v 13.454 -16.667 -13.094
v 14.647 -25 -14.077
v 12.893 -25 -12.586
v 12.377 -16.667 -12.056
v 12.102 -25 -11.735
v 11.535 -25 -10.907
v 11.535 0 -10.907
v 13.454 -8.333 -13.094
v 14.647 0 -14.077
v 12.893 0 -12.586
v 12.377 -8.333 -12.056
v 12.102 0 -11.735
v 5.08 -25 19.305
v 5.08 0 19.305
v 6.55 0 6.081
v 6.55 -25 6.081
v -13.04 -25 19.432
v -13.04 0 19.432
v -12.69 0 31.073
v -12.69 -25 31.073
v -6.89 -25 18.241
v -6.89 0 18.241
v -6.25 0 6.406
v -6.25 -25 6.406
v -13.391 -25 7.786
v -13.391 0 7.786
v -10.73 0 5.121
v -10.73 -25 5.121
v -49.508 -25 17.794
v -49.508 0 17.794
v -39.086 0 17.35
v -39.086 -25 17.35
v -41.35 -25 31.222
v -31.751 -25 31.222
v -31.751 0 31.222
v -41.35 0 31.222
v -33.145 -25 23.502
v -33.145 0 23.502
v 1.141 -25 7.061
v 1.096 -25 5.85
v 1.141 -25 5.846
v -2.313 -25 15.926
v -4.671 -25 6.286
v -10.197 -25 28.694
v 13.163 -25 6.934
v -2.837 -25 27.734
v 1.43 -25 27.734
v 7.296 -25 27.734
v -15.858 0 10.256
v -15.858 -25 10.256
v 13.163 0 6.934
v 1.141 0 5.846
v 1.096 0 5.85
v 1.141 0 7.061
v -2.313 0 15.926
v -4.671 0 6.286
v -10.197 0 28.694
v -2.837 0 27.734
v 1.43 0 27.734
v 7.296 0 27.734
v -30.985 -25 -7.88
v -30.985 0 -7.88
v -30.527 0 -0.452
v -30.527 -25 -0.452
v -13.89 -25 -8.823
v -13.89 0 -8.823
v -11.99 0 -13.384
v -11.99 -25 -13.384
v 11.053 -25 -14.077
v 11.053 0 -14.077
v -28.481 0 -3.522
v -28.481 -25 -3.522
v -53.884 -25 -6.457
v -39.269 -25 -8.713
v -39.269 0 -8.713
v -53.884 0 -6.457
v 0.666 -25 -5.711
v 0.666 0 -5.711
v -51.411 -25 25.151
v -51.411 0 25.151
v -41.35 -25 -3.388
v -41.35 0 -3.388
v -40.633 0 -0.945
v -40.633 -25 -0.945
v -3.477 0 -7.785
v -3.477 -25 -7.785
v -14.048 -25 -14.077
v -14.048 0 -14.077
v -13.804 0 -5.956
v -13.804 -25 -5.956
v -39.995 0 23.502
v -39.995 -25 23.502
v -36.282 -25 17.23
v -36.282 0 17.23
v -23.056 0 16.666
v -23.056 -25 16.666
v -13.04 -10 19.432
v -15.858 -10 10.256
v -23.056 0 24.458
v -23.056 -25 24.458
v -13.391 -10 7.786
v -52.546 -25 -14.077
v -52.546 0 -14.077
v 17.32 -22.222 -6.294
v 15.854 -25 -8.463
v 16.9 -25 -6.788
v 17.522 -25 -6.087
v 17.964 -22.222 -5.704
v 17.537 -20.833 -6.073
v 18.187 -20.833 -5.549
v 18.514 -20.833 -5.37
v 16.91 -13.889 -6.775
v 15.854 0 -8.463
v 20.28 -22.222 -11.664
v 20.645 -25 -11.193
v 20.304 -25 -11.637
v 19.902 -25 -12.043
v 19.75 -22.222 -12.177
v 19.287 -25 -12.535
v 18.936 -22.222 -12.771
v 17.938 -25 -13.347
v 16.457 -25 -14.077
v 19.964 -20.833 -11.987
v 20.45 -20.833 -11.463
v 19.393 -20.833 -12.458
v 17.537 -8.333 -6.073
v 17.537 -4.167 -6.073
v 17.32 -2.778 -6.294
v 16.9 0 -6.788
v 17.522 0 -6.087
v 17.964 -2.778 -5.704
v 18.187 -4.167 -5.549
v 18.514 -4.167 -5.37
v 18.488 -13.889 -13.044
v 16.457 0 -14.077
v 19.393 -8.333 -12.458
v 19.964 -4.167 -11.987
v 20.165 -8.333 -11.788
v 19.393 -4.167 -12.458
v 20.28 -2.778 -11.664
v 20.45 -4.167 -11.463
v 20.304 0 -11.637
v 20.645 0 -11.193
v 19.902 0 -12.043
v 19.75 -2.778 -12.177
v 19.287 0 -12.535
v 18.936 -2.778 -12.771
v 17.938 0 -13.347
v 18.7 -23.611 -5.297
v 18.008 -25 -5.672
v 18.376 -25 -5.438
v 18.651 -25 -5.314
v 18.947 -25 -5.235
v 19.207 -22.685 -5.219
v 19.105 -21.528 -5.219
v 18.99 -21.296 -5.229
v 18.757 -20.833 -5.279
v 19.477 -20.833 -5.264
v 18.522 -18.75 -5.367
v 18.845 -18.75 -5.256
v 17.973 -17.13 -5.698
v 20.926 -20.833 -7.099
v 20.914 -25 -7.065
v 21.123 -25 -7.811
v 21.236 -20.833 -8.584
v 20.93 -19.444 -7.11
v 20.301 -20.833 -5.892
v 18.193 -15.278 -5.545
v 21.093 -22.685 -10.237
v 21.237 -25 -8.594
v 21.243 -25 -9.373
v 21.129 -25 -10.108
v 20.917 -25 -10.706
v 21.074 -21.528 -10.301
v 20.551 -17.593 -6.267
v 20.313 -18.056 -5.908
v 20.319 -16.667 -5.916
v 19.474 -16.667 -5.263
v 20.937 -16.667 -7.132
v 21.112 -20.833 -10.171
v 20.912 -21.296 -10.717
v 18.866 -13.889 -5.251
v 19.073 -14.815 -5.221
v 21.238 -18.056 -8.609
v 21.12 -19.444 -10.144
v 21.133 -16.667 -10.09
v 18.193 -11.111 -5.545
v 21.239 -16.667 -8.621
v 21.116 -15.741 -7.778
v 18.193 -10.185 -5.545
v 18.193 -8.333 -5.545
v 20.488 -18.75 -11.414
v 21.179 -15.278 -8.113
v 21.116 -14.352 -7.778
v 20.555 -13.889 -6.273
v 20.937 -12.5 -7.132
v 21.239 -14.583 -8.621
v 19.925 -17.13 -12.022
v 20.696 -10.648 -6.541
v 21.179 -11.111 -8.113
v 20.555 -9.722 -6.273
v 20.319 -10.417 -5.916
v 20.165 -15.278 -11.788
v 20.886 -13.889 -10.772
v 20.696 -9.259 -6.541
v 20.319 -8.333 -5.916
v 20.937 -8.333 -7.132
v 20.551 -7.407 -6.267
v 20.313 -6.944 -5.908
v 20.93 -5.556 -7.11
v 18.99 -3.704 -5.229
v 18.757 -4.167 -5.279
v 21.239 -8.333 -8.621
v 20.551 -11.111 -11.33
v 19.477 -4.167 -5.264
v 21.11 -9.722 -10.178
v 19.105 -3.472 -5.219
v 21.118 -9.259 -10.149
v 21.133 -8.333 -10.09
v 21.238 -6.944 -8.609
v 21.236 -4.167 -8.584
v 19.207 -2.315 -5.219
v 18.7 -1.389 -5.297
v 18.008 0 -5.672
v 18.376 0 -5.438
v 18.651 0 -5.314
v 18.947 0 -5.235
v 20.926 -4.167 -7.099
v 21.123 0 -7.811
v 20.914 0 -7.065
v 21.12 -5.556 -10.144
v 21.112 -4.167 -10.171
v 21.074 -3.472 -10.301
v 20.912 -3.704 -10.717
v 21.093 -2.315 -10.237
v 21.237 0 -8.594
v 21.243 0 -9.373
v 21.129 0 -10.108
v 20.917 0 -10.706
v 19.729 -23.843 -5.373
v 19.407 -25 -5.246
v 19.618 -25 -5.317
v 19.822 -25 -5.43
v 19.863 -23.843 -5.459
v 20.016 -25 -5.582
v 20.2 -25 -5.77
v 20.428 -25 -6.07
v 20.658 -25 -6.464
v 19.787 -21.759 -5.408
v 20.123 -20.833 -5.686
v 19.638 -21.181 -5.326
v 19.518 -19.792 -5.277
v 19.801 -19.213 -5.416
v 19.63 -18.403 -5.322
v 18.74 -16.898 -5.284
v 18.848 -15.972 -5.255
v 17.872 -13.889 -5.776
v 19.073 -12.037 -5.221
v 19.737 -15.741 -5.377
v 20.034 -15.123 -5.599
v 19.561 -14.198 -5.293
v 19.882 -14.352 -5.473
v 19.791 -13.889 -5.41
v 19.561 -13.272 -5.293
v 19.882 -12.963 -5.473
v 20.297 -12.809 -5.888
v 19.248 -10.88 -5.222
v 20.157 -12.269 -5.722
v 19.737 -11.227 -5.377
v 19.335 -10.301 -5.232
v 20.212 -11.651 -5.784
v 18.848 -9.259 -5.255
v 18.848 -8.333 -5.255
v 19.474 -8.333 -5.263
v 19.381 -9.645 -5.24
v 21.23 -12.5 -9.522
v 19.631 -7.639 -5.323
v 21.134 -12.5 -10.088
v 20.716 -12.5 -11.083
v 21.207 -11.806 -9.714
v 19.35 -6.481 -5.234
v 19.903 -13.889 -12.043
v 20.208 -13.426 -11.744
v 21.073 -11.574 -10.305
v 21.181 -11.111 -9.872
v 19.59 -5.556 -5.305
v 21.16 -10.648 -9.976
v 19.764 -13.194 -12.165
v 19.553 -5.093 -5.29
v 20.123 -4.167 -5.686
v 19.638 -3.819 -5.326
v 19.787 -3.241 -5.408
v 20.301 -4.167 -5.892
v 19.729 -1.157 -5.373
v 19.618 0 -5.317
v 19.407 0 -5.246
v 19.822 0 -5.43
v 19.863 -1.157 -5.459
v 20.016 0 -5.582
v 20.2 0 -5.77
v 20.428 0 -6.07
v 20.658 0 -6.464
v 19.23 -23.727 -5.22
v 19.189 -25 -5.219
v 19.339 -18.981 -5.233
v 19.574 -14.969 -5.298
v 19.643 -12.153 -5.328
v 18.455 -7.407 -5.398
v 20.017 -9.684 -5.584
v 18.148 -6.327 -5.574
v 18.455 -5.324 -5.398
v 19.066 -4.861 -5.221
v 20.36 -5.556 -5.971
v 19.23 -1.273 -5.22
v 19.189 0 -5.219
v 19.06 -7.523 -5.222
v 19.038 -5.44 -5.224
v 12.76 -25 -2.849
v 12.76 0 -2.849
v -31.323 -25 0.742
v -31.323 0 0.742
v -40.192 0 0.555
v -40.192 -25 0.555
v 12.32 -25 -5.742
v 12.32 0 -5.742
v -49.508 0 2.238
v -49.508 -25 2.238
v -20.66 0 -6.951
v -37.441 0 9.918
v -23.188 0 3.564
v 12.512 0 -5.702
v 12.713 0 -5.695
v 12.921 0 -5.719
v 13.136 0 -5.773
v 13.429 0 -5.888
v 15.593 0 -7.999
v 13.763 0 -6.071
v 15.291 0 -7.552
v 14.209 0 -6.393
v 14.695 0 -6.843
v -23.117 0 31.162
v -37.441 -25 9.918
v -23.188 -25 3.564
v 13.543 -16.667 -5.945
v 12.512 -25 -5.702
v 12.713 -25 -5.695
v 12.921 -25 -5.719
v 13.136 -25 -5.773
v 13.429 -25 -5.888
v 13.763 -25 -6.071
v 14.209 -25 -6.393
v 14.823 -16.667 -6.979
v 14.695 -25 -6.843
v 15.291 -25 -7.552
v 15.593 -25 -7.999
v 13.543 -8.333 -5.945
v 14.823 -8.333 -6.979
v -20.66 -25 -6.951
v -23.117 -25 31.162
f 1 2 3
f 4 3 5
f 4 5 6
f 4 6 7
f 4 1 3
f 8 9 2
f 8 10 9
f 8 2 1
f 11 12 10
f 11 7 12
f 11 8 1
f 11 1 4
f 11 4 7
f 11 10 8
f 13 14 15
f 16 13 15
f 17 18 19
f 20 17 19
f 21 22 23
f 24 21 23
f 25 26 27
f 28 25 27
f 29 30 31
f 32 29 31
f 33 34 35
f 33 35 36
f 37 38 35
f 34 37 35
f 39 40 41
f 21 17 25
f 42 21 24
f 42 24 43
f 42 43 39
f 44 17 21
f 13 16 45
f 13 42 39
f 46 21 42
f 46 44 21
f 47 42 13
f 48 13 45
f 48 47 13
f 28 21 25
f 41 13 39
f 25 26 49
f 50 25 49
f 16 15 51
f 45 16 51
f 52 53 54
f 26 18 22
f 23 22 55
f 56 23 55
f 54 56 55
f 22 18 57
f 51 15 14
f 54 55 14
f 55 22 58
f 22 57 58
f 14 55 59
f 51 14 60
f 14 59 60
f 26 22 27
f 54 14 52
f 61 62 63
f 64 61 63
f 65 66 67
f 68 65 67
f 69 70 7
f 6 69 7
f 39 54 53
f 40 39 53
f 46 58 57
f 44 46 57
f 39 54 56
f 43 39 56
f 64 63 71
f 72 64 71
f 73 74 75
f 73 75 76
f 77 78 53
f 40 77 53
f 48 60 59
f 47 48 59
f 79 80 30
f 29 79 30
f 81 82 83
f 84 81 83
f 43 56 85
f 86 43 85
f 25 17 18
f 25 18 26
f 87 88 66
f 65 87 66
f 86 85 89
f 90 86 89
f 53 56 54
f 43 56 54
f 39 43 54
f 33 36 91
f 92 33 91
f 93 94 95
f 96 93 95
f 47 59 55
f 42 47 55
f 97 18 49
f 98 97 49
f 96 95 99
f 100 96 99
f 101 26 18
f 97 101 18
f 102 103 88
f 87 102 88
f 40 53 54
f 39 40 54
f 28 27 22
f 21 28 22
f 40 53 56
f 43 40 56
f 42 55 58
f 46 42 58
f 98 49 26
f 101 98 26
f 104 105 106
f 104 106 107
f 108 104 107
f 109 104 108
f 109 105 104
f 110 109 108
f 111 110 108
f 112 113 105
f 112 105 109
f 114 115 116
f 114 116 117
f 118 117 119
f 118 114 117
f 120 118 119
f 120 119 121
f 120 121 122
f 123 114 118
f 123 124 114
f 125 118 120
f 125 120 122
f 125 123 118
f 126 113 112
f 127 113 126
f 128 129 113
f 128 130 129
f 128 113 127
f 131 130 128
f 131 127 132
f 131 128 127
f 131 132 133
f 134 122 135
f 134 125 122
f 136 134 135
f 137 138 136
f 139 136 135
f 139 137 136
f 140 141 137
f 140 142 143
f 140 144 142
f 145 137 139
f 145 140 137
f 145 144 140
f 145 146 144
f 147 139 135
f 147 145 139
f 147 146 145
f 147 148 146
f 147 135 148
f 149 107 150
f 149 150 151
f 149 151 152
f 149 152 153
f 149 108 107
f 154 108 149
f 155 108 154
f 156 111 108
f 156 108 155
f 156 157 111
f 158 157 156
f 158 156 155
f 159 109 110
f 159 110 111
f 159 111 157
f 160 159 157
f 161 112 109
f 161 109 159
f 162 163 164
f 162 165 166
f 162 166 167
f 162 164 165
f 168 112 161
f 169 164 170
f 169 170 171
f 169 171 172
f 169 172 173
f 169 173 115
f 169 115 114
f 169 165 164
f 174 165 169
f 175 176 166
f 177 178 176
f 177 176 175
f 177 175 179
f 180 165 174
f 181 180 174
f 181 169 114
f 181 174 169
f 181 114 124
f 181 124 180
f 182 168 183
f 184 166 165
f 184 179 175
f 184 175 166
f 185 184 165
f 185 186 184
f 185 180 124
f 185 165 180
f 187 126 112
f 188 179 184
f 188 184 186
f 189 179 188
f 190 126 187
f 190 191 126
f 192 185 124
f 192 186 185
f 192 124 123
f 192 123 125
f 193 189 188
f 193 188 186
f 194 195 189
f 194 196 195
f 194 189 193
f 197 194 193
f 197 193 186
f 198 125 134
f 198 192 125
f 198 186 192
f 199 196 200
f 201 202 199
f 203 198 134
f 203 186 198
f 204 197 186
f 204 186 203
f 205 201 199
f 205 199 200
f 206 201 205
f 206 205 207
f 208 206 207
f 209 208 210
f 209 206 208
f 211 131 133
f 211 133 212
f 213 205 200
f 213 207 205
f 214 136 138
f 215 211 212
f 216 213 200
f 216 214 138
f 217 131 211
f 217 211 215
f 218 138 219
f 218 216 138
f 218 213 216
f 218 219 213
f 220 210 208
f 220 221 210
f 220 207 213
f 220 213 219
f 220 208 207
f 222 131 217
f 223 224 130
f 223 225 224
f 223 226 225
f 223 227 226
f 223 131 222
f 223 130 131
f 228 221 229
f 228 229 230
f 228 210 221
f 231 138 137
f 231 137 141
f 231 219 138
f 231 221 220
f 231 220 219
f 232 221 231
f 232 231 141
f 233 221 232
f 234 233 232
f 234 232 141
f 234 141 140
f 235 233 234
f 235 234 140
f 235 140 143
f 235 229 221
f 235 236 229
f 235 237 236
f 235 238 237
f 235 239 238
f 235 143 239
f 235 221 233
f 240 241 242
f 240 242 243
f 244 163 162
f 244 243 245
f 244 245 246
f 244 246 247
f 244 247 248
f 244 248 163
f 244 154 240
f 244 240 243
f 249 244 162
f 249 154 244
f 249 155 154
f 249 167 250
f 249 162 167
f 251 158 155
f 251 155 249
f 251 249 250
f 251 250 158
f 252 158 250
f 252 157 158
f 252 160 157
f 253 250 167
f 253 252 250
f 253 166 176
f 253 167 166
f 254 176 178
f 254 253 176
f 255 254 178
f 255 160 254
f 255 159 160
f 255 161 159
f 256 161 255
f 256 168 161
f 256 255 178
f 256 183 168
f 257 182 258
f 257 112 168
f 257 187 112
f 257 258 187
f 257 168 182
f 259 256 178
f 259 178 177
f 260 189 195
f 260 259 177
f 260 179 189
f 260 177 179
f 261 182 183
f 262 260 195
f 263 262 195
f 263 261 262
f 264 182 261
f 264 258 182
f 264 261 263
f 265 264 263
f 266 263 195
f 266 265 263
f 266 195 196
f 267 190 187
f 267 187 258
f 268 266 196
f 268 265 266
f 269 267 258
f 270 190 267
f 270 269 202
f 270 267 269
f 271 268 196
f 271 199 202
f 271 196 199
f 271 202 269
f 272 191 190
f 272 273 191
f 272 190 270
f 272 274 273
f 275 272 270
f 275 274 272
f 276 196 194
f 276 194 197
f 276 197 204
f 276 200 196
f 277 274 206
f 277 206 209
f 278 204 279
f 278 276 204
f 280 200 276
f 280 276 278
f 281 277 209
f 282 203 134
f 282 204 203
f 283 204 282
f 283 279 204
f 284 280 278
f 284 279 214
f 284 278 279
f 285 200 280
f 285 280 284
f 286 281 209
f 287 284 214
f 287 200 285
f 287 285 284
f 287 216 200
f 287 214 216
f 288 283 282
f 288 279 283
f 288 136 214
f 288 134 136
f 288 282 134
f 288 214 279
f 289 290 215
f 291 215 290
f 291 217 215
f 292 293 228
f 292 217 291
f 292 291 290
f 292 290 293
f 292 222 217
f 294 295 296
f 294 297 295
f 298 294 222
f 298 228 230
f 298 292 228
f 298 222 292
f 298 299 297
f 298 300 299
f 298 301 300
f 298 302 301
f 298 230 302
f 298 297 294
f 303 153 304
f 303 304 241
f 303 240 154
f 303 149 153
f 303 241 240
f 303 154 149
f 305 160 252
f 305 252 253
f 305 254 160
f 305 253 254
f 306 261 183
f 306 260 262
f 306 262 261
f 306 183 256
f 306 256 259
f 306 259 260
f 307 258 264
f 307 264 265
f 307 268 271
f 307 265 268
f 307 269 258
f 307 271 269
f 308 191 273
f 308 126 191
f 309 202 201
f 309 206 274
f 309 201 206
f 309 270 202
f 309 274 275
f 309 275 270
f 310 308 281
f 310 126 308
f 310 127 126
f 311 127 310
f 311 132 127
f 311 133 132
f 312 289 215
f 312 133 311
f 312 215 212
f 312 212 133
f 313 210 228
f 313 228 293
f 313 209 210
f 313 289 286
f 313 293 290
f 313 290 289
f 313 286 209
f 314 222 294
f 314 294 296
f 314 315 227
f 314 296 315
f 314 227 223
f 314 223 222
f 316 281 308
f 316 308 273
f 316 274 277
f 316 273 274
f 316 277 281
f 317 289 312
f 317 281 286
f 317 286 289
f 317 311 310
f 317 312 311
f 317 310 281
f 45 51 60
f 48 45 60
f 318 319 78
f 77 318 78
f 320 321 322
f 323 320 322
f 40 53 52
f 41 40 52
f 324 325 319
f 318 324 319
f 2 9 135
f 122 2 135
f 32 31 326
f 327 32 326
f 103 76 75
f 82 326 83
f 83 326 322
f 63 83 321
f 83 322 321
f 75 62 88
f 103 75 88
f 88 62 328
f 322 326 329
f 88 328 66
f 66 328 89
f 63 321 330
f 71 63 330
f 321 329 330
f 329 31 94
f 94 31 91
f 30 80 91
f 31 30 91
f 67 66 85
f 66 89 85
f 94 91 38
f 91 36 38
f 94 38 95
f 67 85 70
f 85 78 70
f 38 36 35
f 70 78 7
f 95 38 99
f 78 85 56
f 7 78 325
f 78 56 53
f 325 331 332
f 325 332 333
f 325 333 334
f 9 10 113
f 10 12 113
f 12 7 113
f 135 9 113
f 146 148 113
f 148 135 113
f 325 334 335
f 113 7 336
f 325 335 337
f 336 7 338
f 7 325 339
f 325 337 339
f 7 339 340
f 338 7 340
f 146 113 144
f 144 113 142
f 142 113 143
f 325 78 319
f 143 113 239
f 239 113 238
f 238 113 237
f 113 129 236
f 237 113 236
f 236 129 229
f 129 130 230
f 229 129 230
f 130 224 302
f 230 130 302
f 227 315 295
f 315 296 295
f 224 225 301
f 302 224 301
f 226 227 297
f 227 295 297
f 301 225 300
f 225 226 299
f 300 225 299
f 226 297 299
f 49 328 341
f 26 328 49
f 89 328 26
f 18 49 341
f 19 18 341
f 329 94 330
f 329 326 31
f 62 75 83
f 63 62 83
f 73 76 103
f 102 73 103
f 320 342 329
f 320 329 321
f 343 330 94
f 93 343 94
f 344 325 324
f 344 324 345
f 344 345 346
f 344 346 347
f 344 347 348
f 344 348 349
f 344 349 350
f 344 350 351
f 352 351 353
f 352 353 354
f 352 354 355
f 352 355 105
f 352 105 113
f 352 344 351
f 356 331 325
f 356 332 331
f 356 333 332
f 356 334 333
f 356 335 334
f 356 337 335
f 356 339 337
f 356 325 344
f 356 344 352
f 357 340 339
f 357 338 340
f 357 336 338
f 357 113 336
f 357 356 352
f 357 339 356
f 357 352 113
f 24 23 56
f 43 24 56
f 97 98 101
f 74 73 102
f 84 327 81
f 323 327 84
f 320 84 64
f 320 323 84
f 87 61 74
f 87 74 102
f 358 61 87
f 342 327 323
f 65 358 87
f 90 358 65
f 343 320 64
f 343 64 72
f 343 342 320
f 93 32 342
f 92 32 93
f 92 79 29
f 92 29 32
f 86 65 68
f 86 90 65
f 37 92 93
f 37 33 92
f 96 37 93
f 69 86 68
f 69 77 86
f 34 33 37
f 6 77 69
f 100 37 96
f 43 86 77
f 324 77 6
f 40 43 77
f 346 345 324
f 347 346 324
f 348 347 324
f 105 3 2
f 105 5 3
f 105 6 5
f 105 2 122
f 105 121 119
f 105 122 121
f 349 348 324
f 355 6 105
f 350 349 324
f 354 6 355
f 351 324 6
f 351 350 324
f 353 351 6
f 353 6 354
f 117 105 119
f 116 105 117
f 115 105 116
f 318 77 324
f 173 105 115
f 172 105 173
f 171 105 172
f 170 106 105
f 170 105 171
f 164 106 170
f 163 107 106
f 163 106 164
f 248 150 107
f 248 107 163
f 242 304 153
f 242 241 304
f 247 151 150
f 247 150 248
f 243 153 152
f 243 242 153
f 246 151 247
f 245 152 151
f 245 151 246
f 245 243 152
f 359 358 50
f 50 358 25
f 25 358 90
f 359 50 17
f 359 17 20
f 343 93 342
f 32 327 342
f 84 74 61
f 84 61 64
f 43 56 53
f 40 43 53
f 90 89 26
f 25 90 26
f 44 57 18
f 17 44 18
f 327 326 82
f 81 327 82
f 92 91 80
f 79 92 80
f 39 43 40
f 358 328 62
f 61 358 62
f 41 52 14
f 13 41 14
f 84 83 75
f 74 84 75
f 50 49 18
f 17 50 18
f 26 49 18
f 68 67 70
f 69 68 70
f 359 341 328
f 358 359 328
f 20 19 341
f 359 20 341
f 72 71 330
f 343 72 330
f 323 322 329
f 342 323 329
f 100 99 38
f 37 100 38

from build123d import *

# Parameters (mm, degrees)
F1_DEPTH = 25
F2_DEPTH = 25
F3_DEPTH = 10


with BuildPart() as f1:
    # F0 (on Front) → F1 (new body)
    with BuildSketch(Plane.XZ):
        with BuildLine():
            Line((-13.8038574857, -5.9560307972), (-13.8900675013, -8.8231437689))
            Line((-13.8900675013, -8.8231437689), (-11.9903517299, -13.3844045008))
            Line((-11.9903517299, -13.3844045008), (11.0529363155, -14.0772834495))
            Line((11.0529363155, -14.0772834495), (11.5348120517, -10.9067876988))
            add(Edge.make_bspline(
                [(11.5348120517, -10.9067876988), (11.3135547888, -10.5124783179), (10.5686752324, -8.6326108447), (11.272674479, -6.0669834143), (12.3197633371, -5.7422099285)],
                knots=[0.2030198512, 0.2030198512, 0.2030198512, 0.2030198512, 0.268474381, 0.4958313893, 0.4958313893, 0.4958313893, 0.4958313893], degree=3))
            Line((12.3197633371, -5.7422099285), (12.7595411614, -2.8486968949))
            Line((12.7595411614, -2.8486968949), (0.6657127524, -5.7112211362))
            Line((0.6657127524, -5.7112211362), (1.0960803472, 5.8498218141))
            Line((1.0960803472, 5.8498218141), (-4.6709247271, 6.2861025564))
            Line((-4.6709247271, 6.2861025564), (-3.4767405596, -7.7850059606))
            Line((-3.4767405596, -7.7850059606), (-13.8038574857, -5.9560307972))
        make_face()
        with BuildLine():
            Line((12.3197633371, -5.7422099285), (11.5348120517, -10.9067876988))
            add(Edge.make_bspline(
                [(14.6470405161, -14.0772834495), (13.434062326, -13.1035488802), (12.2210841359, -12.1298143109), (11.5348120517, -10.9067876988)],
                knots=[0, 0, 0, 0, 0.2030198512, 0.2030198512, 0.2030198512, 0.2030198512], degree=3))
            add(Edge.make_bspline(
                [(14.6470405161, -14.0772834495), (14.7783635464, -12.225537172), (14.9096865767, -10.3737908946), (15.8537942916, -8.4629901722)],
                knots=[0, 0, 0, 0, 0.2567714645, 0.2567714645, 0.2567714645, 0.2567714645], degree=3))
            add(Edge.make_bspline(
                [(12.3197633371, -5.7422099285), (13.4123448631, -5.4033260717), (15.0498181243, -6.8798091029), (15.8537942916, -8.4629901722)],
                knots=[0.4958313893, 0.4958313893, 0.4958313893, 0.4958313893, 0.7330663337, 0.7330663337, 0.7330663337, 0.7330663337], degree=3))
        make_face()
        with BuildLine():
            add(Edge.make_bspline(
                [(14.6470405161, -14.0772834495), (14.7783635464, -12.225537172), (14.9096865767, -10.3737908946), (15.8537942916, -8.4629901722)],
                knots=[0, 0, 0, 0, 0.2567714645, 0.2567714645, 0.2567714645, 0.2567714645], degree=3))
            Line((14.6470405161, -14.0772834495), (16.4571739733, -14.0772834495))
            add(Edge.make_bspline(
                [(15.8537942916, -8.4629901722), (16.7584177928, -10.2443648698), (16.6077958831, -12.1608241597), (16.4571739733, -14.0772834495)],
                knots=[0.7330663337, 0.7330663337, 0.7330663337, 0.7330663337, 1, 1, 1, 1], degree=3))
        make_face()
        with BuildLine():
            add(Edge.make_bspline(
                [(15.8537942916, -8.4629901722), (16.7197902017, -6.710281679), (19.8626204277, -3.0553352577), (22.5428614328, -11.1754474135), (18.5474829796, -13.0805622014), (16.4571739733, -14.0772834495)],
                knots=[0.2567714645, 0.2567714645, 0.2567714645, 0.2567714645, 0.4922986554, 0.7343799329, 1, 1, 1, 1], degree=3))
            add(Edge.make_bspline(
                [(15.8537942916, -8.4629901722), (16.7584177928, -10.2443648698), (16.6077958831, -12.1608241597), (16.4571739733, -14.0772834495)],
                knots=[0.7330663337, 0.7330663337, 0.7330663337, 0.7330663337, 1, 1, 1, 1], degree=3))
        make_face()
        with BuildLine():
            add(Edge.make_bspline(
                [(11.5348120517, -10.9067876988), (11.3135547888, -10.5124783179), (10.5686752324, -8.6326108447), (11.272674479, -6.0669834143), (12.3197633371, -5.7422099285)],
                knots=[0.2030198512, 0.2030198512, 0.2030198512, 0.2030198512, 0.268474381, 0.4958313893, 0.4958313893, 0.4958313893, 0.4958313893], degree=3))
            Line((11.5348120517, -10.9067876988), (12.3197633371, -5.7422099285))
        make_face()
        Polygon((-23.1174211949, 31.1617981642), (-20.6595559266, -6.951203708), (-19.0555751324, -6.8069654517), (-17.6979787648, -14.0772834495), (-14.0480520204, -14.0772834495), (-13.8900675013, -8.8231437689), (-15.186149627, -5.7112211362), (-13.8038574857, -5.9560307972), (-13.3906685564, 7.7855203546), (-15.8581826836, 10.2562485263), (-13.0404681098, 19.4322441848), (-12.6904547215, 31.0727469623), align=None)
        Polygon((-31.7507460713, 31.2218852341), (-41.3504131138, 31.2218852341), (-39.9949625134, 23.50179106), (-51.4109507203, 25.1507665962), (-49.5082885027, 17.7937950939), (-39.0860124502, 17.3495599563), (-36.282162182, 17.230049707), (-23.0560358614, 16.6663043201), (-23.0560358614, 24.4576222396), (-33.1453680992, 23.50179106), align=None)
        Polygon((-36.282162182, 17.230049707), (-39.0860124502, 17.3495599563), (-49.5082885027, 2.2380610462), (-41.3504131138, -3.388358266), (-40.6325580547, -0.945351209), (-41.0359203815, 0.5377207999), (-40.1915618765, 0.5554486558), (-37.4405235052, 9.9177928641), (-31.3230953161, 0.7416478779), (-30.4521713406, 0.7599334931), (-30.5270115259, -0.452478159), (-28.4808389843, -3.5217378754), (-23.1880545616, 3.5641349386), align=None)
        Polygon((-40.1915618765, 0.5554486558), (-40.6325580547, -0.945351209), (-39.2688455248, -8.7125019663), (-53.8843795657, -6.4565665089), (-52.5463770596, -14.0772834495), (-20.2000029385, -14.0772834495), (-20.6595559266, -6.951203708), (-30.9854857624, -7.879764773), (-30.5270115259, -0.452478159), (-31.3230953161, 0.7416478779), align=None)
        Polygon((-41.0359203815, 0.5377207999), (-40.6325580547, -0.945351209), (-40.1915618765, 0.5554486558), align=None)
        Polygon((-31.3230953161, 0.7416478779), (-30.5270115259, -0.452478159), (-30.4521713406, 0.7599334931), align=None)
        Polygon((-19.0555751324, -6.8069654517), (-20.6595559266, -6.951203708), (-20.2000029385, -14.0772834495), (-17.6979787648, -14.0772834495), align=None)
        Polygon((-15.186149627, -5.7112211362), (-13.8900675013, -8.8231437689), (-13.8038574857, -5.9560307972), align=None)
    extrude(amount=F1_DEPTH)


with BuildPart() as f1b:
    # F0 (on Front) → F1, piece 2 (new body)
    with BuildSketch(Plane.XZ):
        Polygon((-10.1965051144, 28.6937188357), (-13.0404681098, 19.4322441848), (-13.3906685564, 7.7855203546), (-10.7298232615, 5.121209193), (-6.889954675, 18.2407516986), (-6.2502167691, 6.4055778638), (-4.6709247271, 6.2861025564), (1.1411806336, 7.0613590069), (1.0960803472, 5.8498218141), (1.1411806336, 5.8464099242), (5.0802672746, 19.3049472298), (6.5495739691, 6.0811755247), (13.1626743823, 6.9344793446), (7.2962138802, 27.733752504), (1.4297531452, 27.733752504), (-2.3134381045, 15.9262754023), (-2.8367643245, 27.733752504), align=None)
    extrude(amount=F1_DEPTH)


with BuildPart() as f2:
    # F0 (on Front) → F2 (new body)
    with BuildSketch(Plane.XZ):
        Polygon((1.1411806336, 7.0613590069), (-4.6709247271, 6.2861025564), (1.0960803472, 5.8498218141), align=None)
    extrude(amount=F2_DEPTH)


with BuildPart() as f3:
    # F0 (on Front) → F3 (new body)
    with BuildSketch(Plane.XZ):
        Polygon((-13.3906685564, 7.7855203546), (-13.0404681098, 19.4322441848), (-15.8581826836, 10.2562485263), align=None)
    extrude(amount=F3_DEPTH)


solid = Compound([f1.part, f1b.part, f2.part, f3.part])
